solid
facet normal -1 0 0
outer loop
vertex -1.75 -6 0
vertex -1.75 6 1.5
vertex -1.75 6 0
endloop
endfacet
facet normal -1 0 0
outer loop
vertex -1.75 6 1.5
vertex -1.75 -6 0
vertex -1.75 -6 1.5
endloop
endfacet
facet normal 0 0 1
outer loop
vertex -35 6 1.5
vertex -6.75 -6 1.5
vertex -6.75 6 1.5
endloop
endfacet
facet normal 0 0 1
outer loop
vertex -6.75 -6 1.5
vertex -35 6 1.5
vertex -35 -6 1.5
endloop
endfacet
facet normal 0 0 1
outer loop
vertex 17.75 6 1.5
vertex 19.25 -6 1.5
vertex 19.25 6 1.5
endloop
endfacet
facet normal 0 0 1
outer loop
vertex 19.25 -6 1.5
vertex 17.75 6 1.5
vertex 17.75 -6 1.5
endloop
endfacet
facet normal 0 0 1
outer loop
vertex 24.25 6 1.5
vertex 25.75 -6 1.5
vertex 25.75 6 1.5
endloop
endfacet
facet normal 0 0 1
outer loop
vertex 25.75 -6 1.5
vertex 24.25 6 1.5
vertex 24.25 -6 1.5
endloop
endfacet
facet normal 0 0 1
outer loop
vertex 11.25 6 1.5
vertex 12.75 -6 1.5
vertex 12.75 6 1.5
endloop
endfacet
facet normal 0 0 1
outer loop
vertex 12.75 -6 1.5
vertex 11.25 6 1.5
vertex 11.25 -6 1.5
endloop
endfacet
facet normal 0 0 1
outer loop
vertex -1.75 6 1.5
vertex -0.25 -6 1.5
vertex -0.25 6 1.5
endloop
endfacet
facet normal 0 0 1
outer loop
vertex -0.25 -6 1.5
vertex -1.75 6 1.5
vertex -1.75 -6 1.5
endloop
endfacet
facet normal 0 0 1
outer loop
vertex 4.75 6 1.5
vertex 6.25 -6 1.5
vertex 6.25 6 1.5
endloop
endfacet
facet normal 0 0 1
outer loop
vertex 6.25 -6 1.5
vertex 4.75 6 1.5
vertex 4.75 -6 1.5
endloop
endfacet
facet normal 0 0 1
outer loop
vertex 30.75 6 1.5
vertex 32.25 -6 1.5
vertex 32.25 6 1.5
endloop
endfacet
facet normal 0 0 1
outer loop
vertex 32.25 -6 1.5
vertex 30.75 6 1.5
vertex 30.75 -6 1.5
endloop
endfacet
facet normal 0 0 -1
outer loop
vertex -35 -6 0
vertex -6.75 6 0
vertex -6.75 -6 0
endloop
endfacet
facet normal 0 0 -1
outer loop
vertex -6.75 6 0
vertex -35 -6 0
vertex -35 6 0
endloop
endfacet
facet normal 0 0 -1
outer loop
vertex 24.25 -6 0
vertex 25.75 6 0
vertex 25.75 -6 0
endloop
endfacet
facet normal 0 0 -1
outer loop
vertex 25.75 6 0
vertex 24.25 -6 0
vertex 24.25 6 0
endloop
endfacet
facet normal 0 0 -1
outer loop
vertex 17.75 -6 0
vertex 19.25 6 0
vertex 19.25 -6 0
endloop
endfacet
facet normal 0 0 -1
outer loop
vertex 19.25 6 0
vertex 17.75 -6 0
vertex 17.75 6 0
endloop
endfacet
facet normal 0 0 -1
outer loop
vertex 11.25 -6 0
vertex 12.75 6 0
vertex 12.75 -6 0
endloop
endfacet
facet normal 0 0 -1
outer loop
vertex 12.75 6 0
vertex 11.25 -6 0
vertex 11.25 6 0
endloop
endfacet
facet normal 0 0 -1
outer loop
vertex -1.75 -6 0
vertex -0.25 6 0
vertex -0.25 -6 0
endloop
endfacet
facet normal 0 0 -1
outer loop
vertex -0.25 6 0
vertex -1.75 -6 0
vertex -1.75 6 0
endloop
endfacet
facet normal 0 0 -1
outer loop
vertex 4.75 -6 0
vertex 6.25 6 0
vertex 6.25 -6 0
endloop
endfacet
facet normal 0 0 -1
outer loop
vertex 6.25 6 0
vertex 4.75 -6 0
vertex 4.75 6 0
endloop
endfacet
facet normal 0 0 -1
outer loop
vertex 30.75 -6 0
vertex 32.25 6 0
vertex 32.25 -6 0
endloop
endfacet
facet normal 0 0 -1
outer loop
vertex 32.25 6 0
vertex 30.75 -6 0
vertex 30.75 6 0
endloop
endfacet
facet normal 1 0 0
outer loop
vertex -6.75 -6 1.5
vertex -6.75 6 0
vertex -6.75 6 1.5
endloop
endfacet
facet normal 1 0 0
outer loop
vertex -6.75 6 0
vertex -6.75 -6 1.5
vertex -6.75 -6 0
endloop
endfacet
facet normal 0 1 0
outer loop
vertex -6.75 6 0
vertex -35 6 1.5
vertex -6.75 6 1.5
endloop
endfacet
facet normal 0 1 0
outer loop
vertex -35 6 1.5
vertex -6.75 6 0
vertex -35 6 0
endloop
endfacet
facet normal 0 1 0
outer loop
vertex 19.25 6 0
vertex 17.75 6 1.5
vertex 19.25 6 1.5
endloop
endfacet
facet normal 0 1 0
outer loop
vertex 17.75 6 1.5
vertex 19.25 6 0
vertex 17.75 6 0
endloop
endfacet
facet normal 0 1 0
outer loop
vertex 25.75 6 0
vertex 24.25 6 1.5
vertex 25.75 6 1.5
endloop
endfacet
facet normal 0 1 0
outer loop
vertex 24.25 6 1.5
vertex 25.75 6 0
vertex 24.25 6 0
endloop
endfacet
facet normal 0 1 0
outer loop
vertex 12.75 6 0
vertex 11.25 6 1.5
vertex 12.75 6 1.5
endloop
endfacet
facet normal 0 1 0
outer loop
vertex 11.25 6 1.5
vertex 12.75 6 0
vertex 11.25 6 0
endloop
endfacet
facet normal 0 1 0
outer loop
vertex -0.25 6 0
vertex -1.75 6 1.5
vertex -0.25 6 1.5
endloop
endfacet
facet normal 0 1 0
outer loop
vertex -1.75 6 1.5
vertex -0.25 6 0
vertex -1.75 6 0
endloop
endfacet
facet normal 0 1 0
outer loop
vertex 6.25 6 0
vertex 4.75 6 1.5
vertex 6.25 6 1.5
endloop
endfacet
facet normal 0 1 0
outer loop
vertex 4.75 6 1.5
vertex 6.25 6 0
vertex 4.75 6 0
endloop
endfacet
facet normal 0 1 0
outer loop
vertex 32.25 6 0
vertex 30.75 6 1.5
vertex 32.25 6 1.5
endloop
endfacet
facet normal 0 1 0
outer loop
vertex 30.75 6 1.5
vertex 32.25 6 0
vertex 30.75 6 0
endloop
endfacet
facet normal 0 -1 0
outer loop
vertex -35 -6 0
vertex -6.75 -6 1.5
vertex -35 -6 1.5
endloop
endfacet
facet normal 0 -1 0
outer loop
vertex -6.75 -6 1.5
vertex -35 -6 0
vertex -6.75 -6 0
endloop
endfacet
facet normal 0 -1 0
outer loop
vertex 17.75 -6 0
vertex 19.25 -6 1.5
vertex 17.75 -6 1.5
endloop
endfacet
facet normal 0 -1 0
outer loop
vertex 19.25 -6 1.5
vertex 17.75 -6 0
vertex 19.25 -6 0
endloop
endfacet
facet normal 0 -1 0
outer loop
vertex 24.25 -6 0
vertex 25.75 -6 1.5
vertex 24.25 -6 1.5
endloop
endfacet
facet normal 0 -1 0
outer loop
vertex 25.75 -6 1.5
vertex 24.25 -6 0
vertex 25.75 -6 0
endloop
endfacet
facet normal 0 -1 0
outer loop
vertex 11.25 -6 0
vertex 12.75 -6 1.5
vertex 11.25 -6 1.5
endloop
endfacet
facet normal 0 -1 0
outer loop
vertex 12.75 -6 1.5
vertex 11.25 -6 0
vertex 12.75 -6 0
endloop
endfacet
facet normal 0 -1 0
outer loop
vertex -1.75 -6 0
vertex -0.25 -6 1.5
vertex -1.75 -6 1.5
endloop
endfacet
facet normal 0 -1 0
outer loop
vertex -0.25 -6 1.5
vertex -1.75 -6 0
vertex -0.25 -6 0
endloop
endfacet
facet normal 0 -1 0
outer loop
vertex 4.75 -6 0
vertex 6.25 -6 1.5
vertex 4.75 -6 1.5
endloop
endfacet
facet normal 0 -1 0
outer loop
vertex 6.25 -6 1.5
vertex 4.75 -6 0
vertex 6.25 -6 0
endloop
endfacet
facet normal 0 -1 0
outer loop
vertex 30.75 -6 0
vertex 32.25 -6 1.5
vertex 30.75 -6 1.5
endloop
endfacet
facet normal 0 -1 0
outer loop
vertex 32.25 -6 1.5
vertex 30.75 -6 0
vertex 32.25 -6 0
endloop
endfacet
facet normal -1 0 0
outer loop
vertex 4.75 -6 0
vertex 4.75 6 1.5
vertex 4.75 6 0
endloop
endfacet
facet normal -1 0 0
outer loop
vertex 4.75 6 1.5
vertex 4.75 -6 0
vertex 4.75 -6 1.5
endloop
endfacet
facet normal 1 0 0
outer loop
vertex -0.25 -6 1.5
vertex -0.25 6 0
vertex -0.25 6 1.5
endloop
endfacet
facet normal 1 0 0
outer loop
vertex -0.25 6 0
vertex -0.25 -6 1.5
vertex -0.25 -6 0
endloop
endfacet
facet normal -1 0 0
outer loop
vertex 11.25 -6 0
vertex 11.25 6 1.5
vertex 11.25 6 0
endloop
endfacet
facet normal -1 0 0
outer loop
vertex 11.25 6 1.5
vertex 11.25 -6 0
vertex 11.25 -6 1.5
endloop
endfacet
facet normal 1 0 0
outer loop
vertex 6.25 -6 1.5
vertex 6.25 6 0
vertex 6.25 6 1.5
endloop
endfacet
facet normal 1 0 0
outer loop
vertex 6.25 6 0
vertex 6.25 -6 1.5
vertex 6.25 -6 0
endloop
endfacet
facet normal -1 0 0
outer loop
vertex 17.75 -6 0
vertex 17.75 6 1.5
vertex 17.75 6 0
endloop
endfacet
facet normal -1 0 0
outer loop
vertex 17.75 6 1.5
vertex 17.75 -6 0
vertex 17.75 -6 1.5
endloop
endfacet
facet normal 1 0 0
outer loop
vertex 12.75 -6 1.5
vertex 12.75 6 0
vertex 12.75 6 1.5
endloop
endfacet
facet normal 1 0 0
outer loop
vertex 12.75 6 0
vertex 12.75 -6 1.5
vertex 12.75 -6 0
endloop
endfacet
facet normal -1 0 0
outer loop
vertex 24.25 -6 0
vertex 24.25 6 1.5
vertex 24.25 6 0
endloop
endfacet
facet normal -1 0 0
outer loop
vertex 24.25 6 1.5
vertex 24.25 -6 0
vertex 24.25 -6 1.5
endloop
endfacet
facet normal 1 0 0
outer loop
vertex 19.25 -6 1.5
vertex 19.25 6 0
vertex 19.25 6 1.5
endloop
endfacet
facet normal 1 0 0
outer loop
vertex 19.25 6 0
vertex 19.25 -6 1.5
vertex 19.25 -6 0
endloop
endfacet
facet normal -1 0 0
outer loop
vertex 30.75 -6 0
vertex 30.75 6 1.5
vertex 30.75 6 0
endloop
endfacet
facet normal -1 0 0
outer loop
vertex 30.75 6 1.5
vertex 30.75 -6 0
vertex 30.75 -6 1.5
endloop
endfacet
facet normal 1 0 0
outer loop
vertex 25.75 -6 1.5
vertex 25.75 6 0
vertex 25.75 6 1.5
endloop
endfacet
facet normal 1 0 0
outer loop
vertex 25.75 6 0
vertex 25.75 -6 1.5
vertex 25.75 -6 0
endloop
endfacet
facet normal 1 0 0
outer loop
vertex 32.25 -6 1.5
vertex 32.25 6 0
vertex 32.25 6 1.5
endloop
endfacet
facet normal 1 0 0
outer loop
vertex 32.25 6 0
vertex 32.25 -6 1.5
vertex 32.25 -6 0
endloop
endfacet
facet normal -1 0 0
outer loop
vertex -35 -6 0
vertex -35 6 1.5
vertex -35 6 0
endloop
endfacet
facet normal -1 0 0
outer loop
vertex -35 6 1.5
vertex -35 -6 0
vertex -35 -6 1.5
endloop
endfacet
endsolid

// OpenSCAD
// 10-well agarose gel comb, printed lying flat
// Units: mm

// ---- Spine ----
spine_len   = 70;   // spine length along X
spine_wid   = 12;   // spine width along Y
spine_thk   = 1.5;  // spine thickness along Z

// ---- Teeth ----
tooth_count = 10;   // number of teeth
tooth_w     = 5.0;  // tooth width along X
tooth_l     = 12;   // tooth length along Y (hang from -Y edge)
tooth_gap   = 1.5;  // gap between neighbouring teeth along X

// ---- Misc ----
eps = 0.5;          // cutter overshoot past faces

$fn = 64;

// Offset of the first tooth so the row is centred on the spine
row_start = -(tooth_count - 1) * tooth_gap / 2;

difference() {
    // Spine (back bar)
    translate([-spine_len / 2, -spine_wid / 2, 0])
        cube([spine_len, spine_wid, spine_thk]);

    // Teeth, hanging from the -Y edge of the spine
    for (i = [0 : tooth_count - 1])
        translate([row_start + i * (tooth_w + tooth_gap), -spine_wid / 2, 0])
            cube([tooth_w, tooth_l, spine_thk]);
}
